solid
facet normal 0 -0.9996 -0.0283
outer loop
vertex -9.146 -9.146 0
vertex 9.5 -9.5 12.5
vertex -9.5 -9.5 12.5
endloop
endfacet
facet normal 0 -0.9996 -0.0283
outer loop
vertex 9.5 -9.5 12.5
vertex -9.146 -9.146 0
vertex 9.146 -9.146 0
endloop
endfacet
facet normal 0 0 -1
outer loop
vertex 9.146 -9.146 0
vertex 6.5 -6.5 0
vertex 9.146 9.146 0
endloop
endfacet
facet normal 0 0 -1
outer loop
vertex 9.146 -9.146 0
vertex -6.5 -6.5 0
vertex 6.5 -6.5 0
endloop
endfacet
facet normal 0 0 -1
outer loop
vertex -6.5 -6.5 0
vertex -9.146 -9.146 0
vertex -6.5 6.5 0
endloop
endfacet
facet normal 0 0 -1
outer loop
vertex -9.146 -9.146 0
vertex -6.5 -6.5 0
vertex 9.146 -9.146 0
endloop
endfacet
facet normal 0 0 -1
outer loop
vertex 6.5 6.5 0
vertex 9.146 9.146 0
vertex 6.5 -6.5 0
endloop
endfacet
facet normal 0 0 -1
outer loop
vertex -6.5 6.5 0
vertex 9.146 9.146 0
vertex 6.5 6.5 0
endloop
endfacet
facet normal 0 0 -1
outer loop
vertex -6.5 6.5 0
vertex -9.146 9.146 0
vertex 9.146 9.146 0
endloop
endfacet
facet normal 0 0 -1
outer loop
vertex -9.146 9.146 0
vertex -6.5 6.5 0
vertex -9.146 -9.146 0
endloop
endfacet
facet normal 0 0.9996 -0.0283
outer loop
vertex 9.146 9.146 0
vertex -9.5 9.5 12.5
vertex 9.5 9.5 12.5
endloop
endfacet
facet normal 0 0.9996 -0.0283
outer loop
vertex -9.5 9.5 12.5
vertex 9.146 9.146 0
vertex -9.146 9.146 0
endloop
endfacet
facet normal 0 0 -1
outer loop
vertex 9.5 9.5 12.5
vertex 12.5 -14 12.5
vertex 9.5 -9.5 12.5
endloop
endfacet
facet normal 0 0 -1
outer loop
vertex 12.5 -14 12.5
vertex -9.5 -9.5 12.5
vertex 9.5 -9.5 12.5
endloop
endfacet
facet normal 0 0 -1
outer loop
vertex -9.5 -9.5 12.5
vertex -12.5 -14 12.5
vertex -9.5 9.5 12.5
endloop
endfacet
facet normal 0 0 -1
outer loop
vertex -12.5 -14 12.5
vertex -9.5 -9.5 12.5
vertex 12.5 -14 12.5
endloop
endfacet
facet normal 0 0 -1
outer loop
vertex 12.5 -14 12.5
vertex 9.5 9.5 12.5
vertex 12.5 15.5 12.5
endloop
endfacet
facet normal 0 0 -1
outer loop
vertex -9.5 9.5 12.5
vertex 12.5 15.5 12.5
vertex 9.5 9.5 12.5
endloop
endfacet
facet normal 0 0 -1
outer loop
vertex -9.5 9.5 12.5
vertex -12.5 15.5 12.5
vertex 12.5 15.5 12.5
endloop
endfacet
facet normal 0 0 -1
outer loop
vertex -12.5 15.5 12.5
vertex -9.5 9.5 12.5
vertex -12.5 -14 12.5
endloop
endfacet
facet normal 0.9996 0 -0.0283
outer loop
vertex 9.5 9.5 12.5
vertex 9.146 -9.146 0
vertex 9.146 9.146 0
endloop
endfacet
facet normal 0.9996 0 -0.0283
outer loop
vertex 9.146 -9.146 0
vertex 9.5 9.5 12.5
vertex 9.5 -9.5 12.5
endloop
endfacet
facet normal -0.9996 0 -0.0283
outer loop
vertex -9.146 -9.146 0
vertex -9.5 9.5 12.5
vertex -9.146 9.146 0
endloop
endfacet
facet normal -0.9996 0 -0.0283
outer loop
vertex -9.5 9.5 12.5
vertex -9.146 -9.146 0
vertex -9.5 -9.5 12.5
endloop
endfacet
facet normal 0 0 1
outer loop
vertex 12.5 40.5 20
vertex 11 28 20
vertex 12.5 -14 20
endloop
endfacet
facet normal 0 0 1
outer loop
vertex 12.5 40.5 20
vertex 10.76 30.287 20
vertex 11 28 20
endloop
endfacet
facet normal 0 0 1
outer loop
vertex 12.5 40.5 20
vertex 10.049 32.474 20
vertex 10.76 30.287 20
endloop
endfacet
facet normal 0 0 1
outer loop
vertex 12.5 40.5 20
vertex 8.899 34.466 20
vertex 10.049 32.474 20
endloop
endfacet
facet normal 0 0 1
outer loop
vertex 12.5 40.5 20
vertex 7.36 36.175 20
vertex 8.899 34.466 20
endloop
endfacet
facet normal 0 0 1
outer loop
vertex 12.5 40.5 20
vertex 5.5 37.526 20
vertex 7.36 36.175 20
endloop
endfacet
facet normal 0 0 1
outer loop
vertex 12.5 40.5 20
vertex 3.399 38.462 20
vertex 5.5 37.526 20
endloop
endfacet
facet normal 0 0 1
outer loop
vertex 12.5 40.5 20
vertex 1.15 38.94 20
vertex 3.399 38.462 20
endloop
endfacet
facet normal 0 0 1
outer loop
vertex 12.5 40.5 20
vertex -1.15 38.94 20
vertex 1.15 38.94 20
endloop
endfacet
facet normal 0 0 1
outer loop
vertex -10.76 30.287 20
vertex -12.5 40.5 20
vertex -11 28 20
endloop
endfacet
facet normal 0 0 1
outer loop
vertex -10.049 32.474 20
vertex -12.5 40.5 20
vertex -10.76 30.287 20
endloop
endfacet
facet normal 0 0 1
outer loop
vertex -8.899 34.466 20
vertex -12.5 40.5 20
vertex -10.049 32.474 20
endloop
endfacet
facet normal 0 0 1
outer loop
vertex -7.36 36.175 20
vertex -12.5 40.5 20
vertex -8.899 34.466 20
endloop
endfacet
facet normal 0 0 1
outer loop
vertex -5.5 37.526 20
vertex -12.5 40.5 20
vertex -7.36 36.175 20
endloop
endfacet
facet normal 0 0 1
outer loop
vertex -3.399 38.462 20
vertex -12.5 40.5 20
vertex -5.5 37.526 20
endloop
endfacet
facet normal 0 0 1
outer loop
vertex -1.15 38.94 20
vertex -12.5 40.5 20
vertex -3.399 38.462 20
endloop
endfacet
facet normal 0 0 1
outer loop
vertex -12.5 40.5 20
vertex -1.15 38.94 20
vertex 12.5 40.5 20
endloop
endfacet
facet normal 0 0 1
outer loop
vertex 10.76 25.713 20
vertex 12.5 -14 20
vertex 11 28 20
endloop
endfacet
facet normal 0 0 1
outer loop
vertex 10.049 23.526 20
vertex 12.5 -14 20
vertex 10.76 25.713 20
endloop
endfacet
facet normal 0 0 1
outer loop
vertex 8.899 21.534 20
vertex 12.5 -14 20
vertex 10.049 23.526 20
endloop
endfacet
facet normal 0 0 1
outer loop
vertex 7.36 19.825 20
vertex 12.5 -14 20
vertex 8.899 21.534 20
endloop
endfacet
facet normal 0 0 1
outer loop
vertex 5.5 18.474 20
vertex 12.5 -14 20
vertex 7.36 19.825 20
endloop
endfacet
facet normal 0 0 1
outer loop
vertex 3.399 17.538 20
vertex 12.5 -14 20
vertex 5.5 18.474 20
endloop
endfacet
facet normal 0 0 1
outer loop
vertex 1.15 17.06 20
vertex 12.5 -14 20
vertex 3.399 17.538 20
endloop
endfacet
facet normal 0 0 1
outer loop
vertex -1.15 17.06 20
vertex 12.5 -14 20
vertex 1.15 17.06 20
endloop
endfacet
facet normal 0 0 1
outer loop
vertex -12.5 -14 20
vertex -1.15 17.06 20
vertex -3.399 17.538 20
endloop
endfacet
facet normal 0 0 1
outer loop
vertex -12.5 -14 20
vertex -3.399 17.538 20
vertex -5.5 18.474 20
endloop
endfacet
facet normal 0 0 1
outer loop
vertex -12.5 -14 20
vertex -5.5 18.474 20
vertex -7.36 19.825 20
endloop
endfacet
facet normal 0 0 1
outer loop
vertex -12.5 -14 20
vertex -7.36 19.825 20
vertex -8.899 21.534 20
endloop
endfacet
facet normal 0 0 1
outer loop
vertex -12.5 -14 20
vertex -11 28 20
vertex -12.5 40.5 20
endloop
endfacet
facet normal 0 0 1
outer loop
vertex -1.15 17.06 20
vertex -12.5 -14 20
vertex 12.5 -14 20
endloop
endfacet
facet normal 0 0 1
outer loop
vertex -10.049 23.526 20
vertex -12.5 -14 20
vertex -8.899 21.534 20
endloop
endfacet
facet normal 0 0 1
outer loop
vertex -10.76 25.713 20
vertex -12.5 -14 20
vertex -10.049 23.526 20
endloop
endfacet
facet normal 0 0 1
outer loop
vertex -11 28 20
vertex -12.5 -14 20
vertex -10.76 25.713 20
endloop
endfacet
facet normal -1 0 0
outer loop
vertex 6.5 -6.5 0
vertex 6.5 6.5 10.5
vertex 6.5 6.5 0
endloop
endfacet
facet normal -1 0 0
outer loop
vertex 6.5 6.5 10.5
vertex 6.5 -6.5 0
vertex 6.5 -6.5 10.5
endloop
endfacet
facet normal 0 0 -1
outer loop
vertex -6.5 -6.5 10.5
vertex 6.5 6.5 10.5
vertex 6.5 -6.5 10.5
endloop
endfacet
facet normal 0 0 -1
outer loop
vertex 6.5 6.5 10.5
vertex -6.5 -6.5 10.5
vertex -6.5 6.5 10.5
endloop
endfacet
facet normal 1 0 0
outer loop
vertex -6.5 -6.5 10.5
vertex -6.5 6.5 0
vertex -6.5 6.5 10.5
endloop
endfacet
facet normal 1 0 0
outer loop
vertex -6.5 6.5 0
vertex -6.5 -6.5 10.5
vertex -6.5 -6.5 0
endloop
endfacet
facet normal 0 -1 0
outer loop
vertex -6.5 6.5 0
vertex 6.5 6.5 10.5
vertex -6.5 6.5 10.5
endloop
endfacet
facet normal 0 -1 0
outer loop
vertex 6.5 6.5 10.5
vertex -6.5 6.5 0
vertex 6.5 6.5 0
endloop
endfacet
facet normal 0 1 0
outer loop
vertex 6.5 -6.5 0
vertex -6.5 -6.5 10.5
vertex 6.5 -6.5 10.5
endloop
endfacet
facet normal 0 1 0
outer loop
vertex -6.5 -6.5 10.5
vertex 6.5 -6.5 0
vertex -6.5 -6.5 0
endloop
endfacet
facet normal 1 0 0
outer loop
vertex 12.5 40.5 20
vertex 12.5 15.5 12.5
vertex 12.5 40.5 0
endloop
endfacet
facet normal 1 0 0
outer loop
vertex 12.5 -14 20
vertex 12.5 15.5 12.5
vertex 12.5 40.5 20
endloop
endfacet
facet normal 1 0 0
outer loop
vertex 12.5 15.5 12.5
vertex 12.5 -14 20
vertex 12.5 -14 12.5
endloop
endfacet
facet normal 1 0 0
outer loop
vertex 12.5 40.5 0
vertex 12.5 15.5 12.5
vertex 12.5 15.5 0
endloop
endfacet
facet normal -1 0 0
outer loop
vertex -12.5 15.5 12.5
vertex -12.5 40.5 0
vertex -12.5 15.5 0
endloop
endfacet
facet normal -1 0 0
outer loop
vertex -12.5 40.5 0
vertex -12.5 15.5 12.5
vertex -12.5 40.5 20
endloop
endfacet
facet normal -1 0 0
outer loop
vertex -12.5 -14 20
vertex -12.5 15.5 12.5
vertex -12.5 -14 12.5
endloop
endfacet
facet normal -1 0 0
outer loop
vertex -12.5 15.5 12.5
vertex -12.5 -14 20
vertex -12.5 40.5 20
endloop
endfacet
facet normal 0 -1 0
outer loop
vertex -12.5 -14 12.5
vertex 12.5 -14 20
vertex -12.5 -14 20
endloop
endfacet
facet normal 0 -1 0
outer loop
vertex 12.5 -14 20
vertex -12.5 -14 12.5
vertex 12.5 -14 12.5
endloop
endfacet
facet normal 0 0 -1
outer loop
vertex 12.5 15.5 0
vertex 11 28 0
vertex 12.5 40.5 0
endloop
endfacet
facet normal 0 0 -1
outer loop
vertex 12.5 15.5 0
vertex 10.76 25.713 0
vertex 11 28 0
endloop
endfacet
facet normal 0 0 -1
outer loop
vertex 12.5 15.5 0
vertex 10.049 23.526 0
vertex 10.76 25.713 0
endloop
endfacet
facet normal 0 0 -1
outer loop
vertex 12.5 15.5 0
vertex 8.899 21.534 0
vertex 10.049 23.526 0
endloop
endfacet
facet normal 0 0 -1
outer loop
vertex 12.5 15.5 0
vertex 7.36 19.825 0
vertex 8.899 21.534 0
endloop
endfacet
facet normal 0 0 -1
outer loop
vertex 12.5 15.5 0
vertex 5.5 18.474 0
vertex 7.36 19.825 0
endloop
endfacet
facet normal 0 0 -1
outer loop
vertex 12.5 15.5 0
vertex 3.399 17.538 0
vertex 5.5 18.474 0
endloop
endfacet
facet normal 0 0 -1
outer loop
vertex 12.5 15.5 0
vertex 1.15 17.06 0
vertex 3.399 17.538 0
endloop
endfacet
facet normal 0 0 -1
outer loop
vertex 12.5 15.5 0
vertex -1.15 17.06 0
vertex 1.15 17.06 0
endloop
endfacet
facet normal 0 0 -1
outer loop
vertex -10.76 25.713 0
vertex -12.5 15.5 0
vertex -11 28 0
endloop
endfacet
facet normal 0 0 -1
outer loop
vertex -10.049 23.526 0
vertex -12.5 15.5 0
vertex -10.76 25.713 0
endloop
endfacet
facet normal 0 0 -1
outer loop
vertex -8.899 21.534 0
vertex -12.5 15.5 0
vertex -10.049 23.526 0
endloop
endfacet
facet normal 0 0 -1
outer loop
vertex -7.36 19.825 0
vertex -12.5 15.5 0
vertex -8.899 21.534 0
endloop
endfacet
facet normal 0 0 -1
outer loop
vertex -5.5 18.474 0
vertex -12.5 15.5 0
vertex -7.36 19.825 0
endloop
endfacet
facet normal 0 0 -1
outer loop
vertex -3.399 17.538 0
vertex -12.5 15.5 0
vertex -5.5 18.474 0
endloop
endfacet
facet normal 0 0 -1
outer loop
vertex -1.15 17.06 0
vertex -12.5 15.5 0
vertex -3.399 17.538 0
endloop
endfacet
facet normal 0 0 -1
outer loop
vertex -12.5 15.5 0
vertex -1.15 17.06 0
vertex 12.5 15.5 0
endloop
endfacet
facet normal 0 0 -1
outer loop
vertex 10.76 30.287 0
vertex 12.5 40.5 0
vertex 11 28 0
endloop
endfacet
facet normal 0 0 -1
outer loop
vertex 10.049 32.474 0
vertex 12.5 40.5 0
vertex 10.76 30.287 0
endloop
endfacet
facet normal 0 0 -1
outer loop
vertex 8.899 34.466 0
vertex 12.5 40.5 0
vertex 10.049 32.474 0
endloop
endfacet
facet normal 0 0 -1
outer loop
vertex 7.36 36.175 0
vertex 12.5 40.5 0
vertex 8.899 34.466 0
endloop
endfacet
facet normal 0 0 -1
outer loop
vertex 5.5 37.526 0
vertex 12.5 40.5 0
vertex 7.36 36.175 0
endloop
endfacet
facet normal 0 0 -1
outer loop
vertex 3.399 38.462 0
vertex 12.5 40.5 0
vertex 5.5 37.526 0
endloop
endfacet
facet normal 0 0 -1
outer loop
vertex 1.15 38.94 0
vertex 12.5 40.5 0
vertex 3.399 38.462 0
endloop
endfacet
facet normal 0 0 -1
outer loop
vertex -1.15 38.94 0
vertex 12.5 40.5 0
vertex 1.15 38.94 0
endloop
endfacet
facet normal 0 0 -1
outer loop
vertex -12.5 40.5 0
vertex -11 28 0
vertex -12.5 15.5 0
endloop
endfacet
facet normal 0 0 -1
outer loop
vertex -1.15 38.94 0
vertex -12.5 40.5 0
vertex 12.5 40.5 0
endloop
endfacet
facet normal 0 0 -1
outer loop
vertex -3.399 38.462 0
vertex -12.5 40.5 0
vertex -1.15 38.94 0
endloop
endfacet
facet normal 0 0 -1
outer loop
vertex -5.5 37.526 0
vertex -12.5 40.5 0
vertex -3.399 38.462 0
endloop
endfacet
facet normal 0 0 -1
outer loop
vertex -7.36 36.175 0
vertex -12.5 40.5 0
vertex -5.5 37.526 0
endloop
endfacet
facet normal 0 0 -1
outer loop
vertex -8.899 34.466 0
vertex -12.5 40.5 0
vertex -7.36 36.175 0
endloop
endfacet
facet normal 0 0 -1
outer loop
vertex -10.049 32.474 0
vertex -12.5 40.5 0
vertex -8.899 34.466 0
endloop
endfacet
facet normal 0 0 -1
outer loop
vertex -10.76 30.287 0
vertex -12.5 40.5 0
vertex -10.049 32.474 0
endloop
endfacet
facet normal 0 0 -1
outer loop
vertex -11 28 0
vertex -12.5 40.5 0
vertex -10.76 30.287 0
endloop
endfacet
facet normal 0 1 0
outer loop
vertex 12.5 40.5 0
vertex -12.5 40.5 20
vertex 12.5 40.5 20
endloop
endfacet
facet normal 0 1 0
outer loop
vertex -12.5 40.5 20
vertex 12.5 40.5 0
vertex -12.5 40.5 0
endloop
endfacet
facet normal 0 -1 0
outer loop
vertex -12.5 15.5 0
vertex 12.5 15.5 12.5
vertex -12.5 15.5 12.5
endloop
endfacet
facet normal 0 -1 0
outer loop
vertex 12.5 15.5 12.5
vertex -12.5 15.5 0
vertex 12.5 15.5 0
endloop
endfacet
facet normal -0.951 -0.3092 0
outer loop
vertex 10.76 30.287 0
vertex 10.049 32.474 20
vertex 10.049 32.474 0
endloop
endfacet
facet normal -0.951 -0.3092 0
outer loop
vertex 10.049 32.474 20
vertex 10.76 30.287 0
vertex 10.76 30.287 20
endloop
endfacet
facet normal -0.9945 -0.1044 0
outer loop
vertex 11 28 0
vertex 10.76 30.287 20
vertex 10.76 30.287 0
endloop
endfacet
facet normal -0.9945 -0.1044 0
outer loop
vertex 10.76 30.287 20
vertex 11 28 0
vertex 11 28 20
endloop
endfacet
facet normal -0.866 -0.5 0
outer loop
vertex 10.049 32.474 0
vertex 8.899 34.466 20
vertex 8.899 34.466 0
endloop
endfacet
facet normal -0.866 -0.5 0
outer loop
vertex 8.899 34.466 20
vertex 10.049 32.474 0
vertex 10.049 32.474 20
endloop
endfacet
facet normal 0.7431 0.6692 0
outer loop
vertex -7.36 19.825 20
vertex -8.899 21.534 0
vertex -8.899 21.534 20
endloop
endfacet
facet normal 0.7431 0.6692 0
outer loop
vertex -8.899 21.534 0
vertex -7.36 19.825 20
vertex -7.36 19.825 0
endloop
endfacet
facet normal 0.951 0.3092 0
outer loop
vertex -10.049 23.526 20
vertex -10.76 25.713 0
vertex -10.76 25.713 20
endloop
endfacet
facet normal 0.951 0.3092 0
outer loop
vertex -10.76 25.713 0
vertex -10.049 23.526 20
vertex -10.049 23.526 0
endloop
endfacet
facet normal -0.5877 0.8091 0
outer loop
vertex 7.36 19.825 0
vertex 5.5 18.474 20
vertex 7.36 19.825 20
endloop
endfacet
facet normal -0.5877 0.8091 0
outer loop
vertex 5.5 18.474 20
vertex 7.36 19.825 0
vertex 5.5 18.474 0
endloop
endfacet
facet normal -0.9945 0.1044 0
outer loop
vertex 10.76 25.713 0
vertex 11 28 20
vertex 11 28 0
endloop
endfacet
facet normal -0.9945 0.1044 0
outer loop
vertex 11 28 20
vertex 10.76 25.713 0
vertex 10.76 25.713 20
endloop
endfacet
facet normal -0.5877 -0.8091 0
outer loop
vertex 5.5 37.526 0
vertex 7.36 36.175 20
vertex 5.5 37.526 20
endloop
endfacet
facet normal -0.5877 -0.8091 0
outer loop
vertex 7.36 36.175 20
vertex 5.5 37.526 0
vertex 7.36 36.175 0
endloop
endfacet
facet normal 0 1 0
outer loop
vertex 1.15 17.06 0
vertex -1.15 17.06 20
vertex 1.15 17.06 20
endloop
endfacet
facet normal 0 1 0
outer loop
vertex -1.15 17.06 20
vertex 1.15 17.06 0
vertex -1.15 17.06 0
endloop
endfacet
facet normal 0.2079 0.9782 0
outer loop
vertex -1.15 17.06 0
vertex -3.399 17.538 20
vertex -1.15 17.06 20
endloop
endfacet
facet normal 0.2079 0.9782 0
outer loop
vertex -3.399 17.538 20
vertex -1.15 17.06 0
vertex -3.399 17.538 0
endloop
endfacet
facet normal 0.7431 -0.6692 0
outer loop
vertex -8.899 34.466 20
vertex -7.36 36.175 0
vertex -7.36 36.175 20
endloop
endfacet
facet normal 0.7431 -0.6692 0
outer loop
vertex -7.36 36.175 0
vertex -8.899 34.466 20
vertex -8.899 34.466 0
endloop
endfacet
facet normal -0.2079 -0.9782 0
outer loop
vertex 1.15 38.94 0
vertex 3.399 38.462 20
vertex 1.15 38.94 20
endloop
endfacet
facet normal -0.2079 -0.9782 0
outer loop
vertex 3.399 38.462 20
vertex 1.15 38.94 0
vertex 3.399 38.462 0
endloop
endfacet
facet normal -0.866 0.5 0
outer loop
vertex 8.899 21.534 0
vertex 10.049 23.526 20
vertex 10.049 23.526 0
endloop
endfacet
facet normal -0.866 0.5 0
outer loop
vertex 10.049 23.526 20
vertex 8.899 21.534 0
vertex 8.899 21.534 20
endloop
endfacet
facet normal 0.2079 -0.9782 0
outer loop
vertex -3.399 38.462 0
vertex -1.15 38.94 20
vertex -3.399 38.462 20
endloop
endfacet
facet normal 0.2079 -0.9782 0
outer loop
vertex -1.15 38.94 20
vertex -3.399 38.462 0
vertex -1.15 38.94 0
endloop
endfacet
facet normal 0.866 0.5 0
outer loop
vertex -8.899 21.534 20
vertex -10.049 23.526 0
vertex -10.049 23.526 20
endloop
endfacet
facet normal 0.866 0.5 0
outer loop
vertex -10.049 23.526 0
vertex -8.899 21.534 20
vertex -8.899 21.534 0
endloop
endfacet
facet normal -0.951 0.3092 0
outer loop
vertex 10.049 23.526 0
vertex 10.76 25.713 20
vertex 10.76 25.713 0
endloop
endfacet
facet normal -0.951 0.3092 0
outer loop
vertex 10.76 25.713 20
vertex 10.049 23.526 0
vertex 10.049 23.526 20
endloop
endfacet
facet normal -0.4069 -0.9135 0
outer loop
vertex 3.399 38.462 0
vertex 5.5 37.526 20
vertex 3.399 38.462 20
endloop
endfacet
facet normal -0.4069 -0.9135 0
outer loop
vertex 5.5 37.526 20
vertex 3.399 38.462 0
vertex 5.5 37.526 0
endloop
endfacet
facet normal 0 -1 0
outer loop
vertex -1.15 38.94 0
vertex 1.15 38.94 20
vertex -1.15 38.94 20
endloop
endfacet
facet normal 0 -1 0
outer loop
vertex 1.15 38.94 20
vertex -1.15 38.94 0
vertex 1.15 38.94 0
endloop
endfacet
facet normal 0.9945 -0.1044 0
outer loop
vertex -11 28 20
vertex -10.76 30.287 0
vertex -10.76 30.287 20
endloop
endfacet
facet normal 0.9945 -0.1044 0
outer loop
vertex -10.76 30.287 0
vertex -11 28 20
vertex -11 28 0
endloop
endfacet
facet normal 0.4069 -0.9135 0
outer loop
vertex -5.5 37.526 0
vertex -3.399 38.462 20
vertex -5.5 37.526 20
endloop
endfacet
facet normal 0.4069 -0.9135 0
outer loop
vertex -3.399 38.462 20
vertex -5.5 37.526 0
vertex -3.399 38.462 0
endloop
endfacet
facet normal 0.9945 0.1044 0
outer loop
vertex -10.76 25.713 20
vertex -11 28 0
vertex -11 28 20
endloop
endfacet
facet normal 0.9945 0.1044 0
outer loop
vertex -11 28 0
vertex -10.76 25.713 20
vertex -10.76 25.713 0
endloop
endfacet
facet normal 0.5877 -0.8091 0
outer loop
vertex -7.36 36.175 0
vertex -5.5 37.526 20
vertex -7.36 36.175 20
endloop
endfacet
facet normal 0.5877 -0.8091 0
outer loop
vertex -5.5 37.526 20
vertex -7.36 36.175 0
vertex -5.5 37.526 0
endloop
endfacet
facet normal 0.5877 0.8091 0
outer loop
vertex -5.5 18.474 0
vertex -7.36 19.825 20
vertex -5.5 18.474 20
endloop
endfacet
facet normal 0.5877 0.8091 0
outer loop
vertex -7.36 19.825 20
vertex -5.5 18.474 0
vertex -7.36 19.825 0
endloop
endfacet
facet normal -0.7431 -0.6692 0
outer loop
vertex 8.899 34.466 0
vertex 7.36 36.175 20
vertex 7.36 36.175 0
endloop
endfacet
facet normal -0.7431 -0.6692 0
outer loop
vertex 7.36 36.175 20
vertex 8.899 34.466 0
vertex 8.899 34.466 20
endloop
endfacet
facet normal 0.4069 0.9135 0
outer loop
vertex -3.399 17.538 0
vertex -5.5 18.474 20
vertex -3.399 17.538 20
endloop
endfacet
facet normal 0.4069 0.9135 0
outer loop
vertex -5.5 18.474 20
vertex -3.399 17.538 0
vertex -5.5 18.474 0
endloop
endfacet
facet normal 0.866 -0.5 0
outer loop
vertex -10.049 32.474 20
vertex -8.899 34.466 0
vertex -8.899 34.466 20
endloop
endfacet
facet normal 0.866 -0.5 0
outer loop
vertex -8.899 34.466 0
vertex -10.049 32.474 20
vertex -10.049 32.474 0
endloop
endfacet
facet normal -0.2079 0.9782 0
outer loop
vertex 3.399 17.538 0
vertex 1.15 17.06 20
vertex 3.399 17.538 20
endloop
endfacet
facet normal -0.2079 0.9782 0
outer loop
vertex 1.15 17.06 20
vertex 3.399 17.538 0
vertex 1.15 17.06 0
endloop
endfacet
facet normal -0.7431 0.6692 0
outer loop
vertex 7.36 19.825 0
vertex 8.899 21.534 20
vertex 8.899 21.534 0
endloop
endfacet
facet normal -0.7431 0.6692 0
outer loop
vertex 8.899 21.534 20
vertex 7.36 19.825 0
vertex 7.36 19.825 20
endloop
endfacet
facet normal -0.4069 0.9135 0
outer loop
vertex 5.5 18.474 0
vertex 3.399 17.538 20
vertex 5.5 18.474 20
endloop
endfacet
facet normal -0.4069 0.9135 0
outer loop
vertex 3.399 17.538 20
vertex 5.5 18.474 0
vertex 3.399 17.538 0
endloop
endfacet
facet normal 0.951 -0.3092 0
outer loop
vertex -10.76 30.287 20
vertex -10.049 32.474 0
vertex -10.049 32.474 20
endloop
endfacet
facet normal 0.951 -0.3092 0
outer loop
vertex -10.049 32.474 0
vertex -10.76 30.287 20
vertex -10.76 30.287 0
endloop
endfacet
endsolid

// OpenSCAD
module cup(width, side, h1, h2, is_empty=true) {
    difference() {
        rotate([0, 0, 45]) union() {
            cylinder(d1 = (width - side*2)*sqrt(2)-1, 
                    d2 = (width - side*2)*sqrt(2),
                    h = h1,
                    $fn = 4);
            translate([0, 0, h1])
                cylinder(d1 = (width)*sqrt(2), 
                         d2 = (width)*sqrt(2)-2, 
                         h = h2,
                         $fn = 4); 
        }
        if(is_empty) {
            translate([0, 0, (h1-2)/2])
                cube([(width - side*4),
                      (width - side*4),
                      (h1-2)],
                      center = true);
        }
    }
}

module central_module() {
    w_full = 85;
    w_central = 65;
    w_cup = (w_full - w_central)/2;
    w_empty = 20;
    d = 22;
    
    difference() {
        cup(25, 3, (w_central - w_empty)/2, w_cup, false);
        cylinder(d = d,
                 h = (w_central - w_empty)/2 + w_cup);
    }
}

module central_module_2() {
    w_full = 80;
    w_central = 65;
    w_cup = (w_full - w_central)/2;
    w_empty = 40;
    d = 22;
    
    difference() {
        union() {
            cup(25, 3, (w_central - w_empty)/2, w_cup, true);
            translate([0, 25/2, w_cup/2 + (w_central - w_empty)/2])
                cube([25, 50+3, w_cup], center=true);
            translate([0, 25+3,  ((w_central - w_empty)/2 + w_cup)/2])
                cube([25, 25,  (w_central - w_empty)/2 + w_cup], center=true);
        }
        translate([0, 25+3,  0])
        cylinder(d = d,
                 h = (w_central - w_empty)/2 + w_cup);
    }
}

//cup(25, 2, 15, 2);
central_module_2();
